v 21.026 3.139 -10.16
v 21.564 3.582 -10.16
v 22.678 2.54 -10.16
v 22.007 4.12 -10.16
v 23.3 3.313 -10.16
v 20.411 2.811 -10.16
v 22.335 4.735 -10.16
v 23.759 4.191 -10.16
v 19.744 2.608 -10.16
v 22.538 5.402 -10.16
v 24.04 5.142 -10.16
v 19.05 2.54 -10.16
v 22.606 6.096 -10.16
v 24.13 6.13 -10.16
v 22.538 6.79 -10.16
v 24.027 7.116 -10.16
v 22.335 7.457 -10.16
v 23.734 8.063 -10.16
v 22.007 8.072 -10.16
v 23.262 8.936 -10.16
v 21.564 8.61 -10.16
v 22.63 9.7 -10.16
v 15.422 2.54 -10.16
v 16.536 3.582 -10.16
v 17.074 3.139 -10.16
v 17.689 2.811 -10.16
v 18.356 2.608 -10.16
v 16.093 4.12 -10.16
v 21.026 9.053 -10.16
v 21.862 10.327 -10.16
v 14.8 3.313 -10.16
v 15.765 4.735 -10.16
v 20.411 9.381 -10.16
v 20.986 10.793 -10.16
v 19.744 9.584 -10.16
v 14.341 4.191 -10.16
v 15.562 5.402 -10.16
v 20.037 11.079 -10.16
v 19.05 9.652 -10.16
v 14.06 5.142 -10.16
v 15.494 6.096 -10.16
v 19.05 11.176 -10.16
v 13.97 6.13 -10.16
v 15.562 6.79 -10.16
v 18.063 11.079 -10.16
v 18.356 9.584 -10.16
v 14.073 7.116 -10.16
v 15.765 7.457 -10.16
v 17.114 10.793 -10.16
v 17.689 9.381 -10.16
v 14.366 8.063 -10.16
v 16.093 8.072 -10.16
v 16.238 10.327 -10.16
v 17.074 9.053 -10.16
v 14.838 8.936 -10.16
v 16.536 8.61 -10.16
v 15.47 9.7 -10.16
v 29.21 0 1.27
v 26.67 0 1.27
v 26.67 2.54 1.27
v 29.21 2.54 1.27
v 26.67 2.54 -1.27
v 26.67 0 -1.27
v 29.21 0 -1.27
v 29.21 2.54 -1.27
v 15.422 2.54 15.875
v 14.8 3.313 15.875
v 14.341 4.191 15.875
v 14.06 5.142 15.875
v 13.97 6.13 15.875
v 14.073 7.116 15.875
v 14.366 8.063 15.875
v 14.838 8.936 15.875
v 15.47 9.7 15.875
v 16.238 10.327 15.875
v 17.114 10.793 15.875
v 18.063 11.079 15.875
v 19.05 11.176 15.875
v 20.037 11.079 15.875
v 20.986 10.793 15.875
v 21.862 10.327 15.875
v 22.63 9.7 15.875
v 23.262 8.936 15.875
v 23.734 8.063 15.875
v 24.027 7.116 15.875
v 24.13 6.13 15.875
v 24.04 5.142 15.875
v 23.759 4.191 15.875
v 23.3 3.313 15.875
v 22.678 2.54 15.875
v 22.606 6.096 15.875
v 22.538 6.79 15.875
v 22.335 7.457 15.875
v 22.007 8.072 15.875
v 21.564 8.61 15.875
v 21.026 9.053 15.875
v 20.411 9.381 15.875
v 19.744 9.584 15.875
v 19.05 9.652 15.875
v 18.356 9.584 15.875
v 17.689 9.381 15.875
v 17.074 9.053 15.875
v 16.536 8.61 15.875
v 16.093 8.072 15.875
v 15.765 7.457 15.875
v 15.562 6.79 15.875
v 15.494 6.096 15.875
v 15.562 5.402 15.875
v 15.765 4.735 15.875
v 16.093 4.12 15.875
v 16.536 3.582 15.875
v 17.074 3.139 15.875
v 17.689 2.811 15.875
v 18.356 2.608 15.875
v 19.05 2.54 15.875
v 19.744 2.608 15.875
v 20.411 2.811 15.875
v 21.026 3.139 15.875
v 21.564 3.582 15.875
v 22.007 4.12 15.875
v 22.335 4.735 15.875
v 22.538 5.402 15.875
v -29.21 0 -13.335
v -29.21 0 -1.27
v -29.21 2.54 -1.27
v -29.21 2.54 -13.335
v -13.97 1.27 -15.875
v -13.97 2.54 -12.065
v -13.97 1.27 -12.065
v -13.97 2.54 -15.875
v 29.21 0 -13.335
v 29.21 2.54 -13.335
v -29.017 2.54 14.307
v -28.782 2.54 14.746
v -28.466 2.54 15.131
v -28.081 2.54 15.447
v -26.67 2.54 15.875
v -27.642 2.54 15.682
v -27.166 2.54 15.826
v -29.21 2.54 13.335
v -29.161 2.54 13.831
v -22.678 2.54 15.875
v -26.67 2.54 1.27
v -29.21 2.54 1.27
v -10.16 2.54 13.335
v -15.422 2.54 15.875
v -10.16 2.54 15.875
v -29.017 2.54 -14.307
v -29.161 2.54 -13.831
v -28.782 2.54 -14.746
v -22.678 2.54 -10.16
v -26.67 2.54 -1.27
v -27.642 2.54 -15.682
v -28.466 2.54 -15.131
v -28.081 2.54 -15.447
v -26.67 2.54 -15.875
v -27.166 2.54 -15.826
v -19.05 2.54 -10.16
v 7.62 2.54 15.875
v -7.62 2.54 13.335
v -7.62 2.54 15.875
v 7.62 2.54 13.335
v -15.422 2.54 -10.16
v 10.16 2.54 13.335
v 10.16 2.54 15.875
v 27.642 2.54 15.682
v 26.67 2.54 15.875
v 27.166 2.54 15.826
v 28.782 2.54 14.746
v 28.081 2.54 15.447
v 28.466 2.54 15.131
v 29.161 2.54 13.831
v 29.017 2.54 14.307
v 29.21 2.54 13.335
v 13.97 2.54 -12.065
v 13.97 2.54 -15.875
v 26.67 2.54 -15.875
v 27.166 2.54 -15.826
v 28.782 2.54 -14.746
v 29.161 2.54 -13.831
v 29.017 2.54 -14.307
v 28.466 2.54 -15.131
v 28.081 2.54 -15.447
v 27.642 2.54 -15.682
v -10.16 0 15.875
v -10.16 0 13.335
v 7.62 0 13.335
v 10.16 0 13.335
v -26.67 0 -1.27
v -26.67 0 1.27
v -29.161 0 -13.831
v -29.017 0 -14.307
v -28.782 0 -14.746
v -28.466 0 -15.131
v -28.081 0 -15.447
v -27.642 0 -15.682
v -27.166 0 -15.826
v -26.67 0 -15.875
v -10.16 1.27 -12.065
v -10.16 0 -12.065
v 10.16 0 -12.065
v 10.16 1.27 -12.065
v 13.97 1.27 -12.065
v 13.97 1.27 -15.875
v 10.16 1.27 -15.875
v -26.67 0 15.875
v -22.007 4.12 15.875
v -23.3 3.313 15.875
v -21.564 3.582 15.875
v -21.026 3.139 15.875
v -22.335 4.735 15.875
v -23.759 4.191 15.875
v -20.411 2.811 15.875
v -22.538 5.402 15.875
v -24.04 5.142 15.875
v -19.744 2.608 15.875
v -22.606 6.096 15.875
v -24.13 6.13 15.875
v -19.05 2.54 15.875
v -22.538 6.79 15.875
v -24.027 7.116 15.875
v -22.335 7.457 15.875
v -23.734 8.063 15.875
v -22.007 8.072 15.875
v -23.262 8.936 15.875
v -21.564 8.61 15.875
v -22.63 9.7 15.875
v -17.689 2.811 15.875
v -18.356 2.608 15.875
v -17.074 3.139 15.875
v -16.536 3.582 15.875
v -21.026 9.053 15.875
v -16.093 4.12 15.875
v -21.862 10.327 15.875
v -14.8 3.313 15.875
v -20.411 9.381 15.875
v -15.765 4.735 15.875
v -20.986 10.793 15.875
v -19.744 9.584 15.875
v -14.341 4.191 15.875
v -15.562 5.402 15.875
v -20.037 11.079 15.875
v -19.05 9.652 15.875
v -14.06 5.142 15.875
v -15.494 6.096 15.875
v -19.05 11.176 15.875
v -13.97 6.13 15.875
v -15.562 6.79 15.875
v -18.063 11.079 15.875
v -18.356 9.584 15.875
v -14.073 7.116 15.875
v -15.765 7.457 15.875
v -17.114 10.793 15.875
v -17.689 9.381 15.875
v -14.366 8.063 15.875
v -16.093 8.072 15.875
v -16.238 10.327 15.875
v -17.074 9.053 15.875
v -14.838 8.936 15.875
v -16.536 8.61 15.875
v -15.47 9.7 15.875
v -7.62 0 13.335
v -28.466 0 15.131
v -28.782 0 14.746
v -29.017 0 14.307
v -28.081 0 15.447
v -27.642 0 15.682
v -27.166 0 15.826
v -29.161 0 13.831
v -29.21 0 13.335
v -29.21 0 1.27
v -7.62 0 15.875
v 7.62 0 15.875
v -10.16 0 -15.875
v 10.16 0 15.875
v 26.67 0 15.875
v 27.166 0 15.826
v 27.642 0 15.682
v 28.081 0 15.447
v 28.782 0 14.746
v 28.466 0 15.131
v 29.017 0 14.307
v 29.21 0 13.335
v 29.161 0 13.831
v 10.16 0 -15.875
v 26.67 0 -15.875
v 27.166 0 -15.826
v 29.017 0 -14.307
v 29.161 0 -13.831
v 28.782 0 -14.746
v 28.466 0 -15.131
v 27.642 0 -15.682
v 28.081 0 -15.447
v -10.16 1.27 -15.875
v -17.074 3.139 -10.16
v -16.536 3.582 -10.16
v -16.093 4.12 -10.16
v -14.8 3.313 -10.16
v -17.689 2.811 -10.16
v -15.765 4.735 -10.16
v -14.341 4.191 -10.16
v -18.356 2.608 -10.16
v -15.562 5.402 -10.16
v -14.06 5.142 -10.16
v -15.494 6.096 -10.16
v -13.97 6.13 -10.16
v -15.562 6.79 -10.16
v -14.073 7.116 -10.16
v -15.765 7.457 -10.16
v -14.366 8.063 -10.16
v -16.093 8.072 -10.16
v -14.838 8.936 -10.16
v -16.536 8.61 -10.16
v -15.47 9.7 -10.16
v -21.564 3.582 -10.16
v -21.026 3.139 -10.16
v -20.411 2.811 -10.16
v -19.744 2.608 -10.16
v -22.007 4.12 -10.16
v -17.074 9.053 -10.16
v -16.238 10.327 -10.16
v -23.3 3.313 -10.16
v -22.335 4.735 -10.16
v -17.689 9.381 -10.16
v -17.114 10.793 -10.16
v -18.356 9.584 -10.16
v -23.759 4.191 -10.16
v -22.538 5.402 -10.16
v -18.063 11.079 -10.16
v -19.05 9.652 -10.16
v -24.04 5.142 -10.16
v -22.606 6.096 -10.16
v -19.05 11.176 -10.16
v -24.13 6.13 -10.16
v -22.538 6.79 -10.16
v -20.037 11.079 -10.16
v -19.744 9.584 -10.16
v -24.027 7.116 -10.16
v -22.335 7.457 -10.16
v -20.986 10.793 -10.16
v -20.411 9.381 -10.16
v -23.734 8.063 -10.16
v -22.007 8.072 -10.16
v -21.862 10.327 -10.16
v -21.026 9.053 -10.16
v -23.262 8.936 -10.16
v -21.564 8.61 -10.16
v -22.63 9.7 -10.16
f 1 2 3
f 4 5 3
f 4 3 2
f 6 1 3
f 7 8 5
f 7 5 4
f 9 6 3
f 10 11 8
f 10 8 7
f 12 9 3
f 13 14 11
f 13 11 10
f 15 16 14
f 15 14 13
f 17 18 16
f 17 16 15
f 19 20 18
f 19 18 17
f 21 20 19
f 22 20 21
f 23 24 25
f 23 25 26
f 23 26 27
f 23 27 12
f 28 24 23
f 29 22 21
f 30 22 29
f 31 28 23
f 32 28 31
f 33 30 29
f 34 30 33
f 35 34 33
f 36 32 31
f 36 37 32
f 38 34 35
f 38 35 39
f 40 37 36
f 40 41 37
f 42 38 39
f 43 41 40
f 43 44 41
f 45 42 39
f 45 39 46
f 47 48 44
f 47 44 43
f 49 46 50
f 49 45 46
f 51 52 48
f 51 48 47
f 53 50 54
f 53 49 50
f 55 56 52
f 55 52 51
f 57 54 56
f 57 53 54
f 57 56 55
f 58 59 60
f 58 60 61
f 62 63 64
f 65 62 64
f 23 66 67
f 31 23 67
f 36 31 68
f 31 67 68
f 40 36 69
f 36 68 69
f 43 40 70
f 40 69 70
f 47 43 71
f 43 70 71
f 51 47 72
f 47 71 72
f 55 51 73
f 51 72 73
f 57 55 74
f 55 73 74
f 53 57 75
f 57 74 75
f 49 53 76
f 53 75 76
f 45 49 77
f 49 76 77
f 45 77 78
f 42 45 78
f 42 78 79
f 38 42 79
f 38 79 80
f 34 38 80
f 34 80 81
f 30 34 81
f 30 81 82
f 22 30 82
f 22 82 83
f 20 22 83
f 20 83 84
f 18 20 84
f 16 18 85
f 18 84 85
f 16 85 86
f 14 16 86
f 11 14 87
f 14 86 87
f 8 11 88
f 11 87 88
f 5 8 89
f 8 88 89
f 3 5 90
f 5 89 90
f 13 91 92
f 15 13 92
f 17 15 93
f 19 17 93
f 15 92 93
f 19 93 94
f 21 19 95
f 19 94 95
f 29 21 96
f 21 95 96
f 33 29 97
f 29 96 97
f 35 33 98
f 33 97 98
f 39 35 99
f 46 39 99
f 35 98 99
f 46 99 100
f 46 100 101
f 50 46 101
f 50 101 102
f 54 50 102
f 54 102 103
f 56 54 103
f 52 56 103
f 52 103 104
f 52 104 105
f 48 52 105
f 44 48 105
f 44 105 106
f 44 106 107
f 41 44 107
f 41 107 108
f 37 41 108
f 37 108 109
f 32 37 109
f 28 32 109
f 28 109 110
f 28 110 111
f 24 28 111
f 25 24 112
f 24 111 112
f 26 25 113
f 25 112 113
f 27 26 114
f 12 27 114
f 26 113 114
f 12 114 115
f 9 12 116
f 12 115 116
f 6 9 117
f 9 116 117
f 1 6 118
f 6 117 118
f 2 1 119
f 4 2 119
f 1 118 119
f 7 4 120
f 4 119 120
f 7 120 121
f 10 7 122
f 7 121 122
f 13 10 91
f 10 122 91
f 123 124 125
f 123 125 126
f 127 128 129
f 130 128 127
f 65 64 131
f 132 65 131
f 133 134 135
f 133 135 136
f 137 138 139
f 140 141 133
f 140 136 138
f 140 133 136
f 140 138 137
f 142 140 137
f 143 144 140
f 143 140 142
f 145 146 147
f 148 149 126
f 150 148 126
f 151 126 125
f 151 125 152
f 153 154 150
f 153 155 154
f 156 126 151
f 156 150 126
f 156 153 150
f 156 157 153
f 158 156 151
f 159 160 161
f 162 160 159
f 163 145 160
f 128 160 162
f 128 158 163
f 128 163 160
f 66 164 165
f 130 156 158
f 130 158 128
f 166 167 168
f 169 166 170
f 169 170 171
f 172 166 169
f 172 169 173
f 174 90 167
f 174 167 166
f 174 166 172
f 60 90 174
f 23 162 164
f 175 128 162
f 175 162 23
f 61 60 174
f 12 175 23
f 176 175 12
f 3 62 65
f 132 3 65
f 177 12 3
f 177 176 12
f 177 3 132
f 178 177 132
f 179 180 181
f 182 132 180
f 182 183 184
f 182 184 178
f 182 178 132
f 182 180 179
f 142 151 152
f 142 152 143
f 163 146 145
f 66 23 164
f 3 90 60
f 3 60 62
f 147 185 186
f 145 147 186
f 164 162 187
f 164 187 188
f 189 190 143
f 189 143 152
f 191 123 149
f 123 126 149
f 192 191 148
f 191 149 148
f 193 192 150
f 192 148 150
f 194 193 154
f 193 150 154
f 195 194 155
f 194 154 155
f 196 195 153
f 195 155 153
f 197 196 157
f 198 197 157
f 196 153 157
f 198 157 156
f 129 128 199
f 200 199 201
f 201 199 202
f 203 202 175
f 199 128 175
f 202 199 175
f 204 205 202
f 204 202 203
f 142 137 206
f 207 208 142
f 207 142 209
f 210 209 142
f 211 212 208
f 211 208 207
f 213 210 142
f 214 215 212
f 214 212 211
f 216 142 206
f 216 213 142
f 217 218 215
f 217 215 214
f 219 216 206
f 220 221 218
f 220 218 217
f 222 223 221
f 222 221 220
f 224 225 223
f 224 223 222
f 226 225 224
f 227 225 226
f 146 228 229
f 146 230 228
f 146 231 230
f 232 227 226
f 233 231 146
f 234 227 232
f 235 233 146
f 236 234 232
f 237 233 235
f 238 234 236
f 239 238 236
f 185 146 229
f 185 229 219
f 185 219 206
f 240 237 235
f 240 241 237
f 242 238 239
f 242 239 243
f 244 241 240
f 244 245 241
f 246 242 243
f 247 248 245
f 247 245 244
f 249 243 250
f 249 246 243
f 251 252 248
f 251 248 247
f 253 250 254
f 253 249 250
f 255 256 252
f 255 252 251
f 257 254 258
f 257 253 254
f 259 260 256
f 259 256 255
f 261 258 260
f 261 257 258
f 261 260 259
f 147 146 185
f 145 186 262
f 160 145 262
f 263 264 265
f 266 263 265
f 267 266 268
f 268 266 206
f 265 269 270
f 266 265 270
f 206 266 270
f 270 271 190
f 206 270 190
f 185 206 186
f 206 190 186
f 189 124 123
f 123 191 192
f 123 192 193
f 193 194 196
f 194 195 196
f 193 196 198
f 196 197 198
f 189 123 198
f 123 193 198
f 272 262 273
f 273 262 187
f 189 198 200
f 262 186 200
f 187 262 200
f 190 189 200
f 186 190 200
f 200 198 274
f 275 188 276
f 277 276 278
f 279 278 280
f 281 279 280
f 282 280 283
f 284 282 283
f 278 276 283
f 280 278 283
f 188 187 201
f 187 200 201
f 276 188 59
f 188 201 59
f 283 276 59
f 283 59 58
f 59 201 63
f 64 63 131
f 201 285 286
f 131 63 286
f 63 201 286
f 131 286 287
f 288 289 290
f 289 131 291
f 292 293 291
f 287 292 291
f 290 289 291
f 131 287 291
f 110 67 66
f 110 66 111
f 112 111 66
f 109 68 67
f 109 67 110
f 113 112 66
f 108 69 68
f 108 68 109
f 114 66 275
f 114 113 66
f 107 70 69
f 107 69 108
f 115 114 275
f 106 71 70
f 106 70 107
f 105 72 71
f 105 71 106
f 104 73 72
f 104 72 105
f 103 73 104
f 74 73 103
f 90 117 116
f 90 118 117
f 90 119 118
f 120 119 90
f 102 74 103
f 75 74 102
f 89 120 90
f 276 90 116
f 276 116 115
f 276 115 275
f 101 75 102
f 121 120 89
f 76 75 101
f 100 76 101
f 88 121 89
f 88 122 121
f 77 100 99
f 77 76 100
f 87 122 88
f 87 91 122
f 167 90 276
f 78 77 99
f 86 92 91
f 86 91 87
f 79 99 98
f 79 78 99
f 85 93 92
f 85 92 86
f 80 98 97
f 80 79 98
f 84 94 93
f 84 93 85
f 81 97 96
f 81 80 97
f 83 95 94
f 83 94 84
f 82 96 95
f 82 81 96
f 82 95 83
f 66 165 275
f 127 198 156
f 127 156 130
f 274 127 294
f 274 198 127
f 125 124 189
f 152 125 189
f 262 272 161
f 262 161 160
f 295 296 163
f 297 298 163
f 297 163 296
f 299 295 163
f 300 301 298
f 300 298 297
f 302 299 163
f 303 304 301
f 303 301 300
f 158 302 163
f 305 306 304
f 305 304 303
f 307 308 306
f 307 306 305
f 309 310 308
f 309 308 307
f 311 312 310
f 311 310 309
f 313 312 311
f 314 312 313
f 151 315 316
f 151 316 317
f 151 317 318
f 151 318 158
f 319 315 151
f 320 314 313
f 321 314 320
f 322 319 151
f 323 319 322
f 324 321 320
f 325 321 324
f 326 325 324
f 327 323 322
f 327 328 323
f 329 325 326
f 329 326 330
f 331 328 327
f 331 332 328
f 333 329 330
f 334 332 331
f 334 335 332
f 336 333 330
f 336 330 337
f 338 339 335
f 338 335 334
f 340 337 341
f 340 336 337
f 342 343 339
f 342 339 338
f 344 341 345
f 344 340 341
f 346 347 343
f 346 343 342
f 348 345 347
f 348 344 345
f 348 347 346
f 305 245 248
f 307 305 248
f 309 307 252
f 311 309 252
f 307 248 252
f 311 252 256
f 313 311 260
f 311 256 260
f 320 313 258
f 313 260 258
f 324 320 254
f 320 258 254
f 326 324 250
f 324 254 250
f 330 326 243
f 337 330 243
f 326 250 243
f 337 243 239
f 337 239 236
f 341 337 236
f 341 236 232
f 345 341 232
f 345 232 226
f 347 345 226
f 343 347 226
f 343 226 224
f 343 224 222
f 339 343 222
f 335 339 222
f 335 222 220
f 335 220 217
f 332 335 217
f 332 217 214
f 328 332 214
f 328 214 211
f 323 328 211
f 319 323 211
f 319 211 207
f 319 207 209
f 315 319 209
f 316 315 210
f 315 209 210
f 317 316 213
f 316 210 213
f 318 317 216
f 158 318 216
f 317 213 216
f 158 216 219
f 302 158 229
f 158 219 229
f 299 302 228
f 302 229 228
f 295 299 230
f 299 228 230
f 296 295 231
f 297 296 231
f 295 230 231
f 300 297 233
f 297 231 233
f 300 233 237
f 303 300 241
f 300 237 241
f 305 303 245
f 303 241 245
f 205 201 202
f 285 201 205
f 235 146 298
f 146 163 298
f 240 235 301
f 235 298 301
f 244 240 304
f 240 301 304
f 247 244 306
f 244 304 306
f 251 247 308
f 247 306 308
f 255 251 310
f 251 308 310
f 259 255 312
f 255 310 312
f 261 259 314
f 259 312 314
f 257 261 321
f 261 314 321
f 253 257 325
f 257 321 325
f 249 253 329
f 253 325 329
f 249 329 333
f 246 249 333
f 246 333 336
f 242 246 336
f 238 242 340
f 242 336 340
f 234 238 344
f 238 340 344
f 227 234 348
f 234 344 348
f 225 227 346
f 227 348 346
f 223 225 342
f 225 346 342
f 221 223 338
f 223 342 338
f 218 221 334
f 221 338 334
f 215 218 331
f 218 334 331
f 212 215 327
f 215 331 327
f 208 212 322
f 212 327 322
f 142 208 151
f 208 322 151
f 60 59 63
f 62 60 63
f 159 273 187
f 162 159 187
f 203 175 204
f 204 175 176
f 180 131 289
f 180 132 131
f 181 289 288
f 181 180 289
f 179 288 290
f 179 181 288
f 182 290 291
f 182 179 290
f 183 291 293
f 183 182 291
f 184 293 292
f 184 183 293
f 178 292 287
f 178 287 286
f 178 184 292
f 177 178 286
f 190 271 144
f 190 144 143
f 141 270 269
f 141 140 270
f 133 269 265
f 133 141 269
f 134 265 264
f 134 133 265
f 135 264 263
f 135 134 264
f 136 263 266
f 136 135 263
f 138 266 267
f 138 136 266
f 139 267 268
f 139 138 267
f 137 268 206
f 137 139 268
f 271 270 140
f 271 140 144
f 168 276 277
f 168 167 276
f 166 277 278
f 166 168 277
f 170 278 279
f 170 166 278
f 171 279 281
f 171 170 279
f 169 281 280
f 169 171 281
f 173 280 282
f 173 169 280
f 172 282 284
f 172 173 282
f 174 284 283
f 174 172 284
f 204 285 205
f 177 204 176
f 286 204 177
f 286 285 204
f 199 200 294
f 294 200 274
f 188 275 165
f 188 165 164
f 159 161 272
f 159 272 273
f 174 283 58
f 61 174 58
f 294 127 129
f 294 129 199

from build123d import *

# Parameters (mm, degrees)
SKETCH1_W           = 58.42
SKETCH1_H           = 31.75
BOSS_EXTRUDE1_DEPTH = 2.54
FILLET1_R           = 2.54
SKETCH4_R           = 5.08
BOSS_EXTRUDE3_DEPTH = 15.875
SKETCH5_R           = 5.08
BOSS_EXTRUDE4_DEPTH = 10.16
SKETCH6_R           = 3.556
CUT_EXTRUDE2_DEPTH  = 32.75
SKETCH9_W           = 13.97
SKETCH9_H           = 3.81
CUT_EXTRUDE4_DEPTH  = 1.27
SKETCH10_W          = 2.54
SKETCH10_H          = 2.54
SKETCH10_W_2        = 20.32
SKETCH10_H_2        = 3.81
CUT_EXTRUDE6_DEPTH  = 12.176


with BuildPart() as part:
    # Sketch1 → Boss-Extrude1 (new body)
    with BuildSketch(Plane(origin=(0, 0, 0), x_dir=(1, 0, 0), z_dir=(0, 1, 0))):
        Rectangle(SKETCH1_W, SKETCH1_H)
    extrude(amount=BOSS_EXTRUDE1_DEPTH)

    # Fillet1
    fillet1_edges = [part.edges().sort_by_distance(p)[0] for p in [
        (29.21, 1.27, 15.875),
        (-29.21, 1.27, 15.875),
        (-29.21, 1.27, -15.875),
        (29.21, 1.27, -15.875),
    ]]
    fillet(fillet1_edges, radius=FILLET1_R)

    # Sketch4 → Boss-Extrude3 (add)
    with BuildSketch(Plane.XY):
        with Locations((-19.05, 6.096)):
            Circle(SKETCH4_R)
        with Locations((19.05, 6.096)):
            Circle(SKETCH4_R)
    extrude(amount=BOSS_EXTRUDE3_DEPTH)

    # Sketch5 → Boss-Extrude4 (add)
    with BuildSketch(Plane(origin=(0, 0, 0), x_dir=(-1, 0, 0), z_dir=(0, 0, -1))):
        with Locations((-19.05, 6.096)):
            Circle(SKETCH5_R)
        with Locations((19.05, 6.096)):
            Circle(SKETCH5_R)
    extrude(amount=BOSS_EXTRUDE4_DEPTH)

    # Sketch6 → Cut-Extrude2 (cut, through all)
    with BuildSketch(Plane.XY.offset(15.875)):
        with Locations((-19.05, 6.096)):
            Circle(SKETCH6_R)
        with Locations((19.05, 6.096)):
            Circle(SKETCH6_R)
    extrude(amount=-CUT_EXTRUDE2_DEPTH, mode=Mode.SUBTRACT)

    # Sketch9 → Cut-Extrude4 (cut)
    with BuildSketch(Plane(origin=(0, 2.54, 0), x_dir=(1, 0, 0), z_dir=(0, 1, 0))):
        with Locations((-6.985, 13.97)):
            Rectangle(SKETCH9_W, SKETCH9_H)
        with Locations((6.985, 13.97)):
            Rectangle(SKETCH9_W, SKETCH9_H)
    extrude(amount=-CUT_EXTRUDE4_DEPTH, mode=Mode.SUBTRACT)

    # Sketch10 → Cut-Extrude6 (cut, through all)
    with BuildSketch(Plane(origin=(0, 0, 0), x_dir=(1, 0, 0), z_dir=(0, 1, 0))):
        with Locations((-27.94, 0)):
            Rectangle(SKETCH10_W, SKETCH10_H)
        with Locations((27.94, 0)):
            Rectangle(SKETCH10_W, SKETCH10_H)
        with Locations((0, 13.97)):
            Rectangle(SKETCH10_W_2, SKETCH10_H_2)
        with Locations((-8.89, -14.605)):
            Rectangle(SKETCH10_W, SKETCH10_H)
        with Locations((8.89, -14.605)):
            Rectangle(SKETCH10_W, SKETCH10_H)
    extrude(amount=CUT_EXTRUDE6_DEPTH, mode=Mode.SUBTRACT)


solid = part.part
